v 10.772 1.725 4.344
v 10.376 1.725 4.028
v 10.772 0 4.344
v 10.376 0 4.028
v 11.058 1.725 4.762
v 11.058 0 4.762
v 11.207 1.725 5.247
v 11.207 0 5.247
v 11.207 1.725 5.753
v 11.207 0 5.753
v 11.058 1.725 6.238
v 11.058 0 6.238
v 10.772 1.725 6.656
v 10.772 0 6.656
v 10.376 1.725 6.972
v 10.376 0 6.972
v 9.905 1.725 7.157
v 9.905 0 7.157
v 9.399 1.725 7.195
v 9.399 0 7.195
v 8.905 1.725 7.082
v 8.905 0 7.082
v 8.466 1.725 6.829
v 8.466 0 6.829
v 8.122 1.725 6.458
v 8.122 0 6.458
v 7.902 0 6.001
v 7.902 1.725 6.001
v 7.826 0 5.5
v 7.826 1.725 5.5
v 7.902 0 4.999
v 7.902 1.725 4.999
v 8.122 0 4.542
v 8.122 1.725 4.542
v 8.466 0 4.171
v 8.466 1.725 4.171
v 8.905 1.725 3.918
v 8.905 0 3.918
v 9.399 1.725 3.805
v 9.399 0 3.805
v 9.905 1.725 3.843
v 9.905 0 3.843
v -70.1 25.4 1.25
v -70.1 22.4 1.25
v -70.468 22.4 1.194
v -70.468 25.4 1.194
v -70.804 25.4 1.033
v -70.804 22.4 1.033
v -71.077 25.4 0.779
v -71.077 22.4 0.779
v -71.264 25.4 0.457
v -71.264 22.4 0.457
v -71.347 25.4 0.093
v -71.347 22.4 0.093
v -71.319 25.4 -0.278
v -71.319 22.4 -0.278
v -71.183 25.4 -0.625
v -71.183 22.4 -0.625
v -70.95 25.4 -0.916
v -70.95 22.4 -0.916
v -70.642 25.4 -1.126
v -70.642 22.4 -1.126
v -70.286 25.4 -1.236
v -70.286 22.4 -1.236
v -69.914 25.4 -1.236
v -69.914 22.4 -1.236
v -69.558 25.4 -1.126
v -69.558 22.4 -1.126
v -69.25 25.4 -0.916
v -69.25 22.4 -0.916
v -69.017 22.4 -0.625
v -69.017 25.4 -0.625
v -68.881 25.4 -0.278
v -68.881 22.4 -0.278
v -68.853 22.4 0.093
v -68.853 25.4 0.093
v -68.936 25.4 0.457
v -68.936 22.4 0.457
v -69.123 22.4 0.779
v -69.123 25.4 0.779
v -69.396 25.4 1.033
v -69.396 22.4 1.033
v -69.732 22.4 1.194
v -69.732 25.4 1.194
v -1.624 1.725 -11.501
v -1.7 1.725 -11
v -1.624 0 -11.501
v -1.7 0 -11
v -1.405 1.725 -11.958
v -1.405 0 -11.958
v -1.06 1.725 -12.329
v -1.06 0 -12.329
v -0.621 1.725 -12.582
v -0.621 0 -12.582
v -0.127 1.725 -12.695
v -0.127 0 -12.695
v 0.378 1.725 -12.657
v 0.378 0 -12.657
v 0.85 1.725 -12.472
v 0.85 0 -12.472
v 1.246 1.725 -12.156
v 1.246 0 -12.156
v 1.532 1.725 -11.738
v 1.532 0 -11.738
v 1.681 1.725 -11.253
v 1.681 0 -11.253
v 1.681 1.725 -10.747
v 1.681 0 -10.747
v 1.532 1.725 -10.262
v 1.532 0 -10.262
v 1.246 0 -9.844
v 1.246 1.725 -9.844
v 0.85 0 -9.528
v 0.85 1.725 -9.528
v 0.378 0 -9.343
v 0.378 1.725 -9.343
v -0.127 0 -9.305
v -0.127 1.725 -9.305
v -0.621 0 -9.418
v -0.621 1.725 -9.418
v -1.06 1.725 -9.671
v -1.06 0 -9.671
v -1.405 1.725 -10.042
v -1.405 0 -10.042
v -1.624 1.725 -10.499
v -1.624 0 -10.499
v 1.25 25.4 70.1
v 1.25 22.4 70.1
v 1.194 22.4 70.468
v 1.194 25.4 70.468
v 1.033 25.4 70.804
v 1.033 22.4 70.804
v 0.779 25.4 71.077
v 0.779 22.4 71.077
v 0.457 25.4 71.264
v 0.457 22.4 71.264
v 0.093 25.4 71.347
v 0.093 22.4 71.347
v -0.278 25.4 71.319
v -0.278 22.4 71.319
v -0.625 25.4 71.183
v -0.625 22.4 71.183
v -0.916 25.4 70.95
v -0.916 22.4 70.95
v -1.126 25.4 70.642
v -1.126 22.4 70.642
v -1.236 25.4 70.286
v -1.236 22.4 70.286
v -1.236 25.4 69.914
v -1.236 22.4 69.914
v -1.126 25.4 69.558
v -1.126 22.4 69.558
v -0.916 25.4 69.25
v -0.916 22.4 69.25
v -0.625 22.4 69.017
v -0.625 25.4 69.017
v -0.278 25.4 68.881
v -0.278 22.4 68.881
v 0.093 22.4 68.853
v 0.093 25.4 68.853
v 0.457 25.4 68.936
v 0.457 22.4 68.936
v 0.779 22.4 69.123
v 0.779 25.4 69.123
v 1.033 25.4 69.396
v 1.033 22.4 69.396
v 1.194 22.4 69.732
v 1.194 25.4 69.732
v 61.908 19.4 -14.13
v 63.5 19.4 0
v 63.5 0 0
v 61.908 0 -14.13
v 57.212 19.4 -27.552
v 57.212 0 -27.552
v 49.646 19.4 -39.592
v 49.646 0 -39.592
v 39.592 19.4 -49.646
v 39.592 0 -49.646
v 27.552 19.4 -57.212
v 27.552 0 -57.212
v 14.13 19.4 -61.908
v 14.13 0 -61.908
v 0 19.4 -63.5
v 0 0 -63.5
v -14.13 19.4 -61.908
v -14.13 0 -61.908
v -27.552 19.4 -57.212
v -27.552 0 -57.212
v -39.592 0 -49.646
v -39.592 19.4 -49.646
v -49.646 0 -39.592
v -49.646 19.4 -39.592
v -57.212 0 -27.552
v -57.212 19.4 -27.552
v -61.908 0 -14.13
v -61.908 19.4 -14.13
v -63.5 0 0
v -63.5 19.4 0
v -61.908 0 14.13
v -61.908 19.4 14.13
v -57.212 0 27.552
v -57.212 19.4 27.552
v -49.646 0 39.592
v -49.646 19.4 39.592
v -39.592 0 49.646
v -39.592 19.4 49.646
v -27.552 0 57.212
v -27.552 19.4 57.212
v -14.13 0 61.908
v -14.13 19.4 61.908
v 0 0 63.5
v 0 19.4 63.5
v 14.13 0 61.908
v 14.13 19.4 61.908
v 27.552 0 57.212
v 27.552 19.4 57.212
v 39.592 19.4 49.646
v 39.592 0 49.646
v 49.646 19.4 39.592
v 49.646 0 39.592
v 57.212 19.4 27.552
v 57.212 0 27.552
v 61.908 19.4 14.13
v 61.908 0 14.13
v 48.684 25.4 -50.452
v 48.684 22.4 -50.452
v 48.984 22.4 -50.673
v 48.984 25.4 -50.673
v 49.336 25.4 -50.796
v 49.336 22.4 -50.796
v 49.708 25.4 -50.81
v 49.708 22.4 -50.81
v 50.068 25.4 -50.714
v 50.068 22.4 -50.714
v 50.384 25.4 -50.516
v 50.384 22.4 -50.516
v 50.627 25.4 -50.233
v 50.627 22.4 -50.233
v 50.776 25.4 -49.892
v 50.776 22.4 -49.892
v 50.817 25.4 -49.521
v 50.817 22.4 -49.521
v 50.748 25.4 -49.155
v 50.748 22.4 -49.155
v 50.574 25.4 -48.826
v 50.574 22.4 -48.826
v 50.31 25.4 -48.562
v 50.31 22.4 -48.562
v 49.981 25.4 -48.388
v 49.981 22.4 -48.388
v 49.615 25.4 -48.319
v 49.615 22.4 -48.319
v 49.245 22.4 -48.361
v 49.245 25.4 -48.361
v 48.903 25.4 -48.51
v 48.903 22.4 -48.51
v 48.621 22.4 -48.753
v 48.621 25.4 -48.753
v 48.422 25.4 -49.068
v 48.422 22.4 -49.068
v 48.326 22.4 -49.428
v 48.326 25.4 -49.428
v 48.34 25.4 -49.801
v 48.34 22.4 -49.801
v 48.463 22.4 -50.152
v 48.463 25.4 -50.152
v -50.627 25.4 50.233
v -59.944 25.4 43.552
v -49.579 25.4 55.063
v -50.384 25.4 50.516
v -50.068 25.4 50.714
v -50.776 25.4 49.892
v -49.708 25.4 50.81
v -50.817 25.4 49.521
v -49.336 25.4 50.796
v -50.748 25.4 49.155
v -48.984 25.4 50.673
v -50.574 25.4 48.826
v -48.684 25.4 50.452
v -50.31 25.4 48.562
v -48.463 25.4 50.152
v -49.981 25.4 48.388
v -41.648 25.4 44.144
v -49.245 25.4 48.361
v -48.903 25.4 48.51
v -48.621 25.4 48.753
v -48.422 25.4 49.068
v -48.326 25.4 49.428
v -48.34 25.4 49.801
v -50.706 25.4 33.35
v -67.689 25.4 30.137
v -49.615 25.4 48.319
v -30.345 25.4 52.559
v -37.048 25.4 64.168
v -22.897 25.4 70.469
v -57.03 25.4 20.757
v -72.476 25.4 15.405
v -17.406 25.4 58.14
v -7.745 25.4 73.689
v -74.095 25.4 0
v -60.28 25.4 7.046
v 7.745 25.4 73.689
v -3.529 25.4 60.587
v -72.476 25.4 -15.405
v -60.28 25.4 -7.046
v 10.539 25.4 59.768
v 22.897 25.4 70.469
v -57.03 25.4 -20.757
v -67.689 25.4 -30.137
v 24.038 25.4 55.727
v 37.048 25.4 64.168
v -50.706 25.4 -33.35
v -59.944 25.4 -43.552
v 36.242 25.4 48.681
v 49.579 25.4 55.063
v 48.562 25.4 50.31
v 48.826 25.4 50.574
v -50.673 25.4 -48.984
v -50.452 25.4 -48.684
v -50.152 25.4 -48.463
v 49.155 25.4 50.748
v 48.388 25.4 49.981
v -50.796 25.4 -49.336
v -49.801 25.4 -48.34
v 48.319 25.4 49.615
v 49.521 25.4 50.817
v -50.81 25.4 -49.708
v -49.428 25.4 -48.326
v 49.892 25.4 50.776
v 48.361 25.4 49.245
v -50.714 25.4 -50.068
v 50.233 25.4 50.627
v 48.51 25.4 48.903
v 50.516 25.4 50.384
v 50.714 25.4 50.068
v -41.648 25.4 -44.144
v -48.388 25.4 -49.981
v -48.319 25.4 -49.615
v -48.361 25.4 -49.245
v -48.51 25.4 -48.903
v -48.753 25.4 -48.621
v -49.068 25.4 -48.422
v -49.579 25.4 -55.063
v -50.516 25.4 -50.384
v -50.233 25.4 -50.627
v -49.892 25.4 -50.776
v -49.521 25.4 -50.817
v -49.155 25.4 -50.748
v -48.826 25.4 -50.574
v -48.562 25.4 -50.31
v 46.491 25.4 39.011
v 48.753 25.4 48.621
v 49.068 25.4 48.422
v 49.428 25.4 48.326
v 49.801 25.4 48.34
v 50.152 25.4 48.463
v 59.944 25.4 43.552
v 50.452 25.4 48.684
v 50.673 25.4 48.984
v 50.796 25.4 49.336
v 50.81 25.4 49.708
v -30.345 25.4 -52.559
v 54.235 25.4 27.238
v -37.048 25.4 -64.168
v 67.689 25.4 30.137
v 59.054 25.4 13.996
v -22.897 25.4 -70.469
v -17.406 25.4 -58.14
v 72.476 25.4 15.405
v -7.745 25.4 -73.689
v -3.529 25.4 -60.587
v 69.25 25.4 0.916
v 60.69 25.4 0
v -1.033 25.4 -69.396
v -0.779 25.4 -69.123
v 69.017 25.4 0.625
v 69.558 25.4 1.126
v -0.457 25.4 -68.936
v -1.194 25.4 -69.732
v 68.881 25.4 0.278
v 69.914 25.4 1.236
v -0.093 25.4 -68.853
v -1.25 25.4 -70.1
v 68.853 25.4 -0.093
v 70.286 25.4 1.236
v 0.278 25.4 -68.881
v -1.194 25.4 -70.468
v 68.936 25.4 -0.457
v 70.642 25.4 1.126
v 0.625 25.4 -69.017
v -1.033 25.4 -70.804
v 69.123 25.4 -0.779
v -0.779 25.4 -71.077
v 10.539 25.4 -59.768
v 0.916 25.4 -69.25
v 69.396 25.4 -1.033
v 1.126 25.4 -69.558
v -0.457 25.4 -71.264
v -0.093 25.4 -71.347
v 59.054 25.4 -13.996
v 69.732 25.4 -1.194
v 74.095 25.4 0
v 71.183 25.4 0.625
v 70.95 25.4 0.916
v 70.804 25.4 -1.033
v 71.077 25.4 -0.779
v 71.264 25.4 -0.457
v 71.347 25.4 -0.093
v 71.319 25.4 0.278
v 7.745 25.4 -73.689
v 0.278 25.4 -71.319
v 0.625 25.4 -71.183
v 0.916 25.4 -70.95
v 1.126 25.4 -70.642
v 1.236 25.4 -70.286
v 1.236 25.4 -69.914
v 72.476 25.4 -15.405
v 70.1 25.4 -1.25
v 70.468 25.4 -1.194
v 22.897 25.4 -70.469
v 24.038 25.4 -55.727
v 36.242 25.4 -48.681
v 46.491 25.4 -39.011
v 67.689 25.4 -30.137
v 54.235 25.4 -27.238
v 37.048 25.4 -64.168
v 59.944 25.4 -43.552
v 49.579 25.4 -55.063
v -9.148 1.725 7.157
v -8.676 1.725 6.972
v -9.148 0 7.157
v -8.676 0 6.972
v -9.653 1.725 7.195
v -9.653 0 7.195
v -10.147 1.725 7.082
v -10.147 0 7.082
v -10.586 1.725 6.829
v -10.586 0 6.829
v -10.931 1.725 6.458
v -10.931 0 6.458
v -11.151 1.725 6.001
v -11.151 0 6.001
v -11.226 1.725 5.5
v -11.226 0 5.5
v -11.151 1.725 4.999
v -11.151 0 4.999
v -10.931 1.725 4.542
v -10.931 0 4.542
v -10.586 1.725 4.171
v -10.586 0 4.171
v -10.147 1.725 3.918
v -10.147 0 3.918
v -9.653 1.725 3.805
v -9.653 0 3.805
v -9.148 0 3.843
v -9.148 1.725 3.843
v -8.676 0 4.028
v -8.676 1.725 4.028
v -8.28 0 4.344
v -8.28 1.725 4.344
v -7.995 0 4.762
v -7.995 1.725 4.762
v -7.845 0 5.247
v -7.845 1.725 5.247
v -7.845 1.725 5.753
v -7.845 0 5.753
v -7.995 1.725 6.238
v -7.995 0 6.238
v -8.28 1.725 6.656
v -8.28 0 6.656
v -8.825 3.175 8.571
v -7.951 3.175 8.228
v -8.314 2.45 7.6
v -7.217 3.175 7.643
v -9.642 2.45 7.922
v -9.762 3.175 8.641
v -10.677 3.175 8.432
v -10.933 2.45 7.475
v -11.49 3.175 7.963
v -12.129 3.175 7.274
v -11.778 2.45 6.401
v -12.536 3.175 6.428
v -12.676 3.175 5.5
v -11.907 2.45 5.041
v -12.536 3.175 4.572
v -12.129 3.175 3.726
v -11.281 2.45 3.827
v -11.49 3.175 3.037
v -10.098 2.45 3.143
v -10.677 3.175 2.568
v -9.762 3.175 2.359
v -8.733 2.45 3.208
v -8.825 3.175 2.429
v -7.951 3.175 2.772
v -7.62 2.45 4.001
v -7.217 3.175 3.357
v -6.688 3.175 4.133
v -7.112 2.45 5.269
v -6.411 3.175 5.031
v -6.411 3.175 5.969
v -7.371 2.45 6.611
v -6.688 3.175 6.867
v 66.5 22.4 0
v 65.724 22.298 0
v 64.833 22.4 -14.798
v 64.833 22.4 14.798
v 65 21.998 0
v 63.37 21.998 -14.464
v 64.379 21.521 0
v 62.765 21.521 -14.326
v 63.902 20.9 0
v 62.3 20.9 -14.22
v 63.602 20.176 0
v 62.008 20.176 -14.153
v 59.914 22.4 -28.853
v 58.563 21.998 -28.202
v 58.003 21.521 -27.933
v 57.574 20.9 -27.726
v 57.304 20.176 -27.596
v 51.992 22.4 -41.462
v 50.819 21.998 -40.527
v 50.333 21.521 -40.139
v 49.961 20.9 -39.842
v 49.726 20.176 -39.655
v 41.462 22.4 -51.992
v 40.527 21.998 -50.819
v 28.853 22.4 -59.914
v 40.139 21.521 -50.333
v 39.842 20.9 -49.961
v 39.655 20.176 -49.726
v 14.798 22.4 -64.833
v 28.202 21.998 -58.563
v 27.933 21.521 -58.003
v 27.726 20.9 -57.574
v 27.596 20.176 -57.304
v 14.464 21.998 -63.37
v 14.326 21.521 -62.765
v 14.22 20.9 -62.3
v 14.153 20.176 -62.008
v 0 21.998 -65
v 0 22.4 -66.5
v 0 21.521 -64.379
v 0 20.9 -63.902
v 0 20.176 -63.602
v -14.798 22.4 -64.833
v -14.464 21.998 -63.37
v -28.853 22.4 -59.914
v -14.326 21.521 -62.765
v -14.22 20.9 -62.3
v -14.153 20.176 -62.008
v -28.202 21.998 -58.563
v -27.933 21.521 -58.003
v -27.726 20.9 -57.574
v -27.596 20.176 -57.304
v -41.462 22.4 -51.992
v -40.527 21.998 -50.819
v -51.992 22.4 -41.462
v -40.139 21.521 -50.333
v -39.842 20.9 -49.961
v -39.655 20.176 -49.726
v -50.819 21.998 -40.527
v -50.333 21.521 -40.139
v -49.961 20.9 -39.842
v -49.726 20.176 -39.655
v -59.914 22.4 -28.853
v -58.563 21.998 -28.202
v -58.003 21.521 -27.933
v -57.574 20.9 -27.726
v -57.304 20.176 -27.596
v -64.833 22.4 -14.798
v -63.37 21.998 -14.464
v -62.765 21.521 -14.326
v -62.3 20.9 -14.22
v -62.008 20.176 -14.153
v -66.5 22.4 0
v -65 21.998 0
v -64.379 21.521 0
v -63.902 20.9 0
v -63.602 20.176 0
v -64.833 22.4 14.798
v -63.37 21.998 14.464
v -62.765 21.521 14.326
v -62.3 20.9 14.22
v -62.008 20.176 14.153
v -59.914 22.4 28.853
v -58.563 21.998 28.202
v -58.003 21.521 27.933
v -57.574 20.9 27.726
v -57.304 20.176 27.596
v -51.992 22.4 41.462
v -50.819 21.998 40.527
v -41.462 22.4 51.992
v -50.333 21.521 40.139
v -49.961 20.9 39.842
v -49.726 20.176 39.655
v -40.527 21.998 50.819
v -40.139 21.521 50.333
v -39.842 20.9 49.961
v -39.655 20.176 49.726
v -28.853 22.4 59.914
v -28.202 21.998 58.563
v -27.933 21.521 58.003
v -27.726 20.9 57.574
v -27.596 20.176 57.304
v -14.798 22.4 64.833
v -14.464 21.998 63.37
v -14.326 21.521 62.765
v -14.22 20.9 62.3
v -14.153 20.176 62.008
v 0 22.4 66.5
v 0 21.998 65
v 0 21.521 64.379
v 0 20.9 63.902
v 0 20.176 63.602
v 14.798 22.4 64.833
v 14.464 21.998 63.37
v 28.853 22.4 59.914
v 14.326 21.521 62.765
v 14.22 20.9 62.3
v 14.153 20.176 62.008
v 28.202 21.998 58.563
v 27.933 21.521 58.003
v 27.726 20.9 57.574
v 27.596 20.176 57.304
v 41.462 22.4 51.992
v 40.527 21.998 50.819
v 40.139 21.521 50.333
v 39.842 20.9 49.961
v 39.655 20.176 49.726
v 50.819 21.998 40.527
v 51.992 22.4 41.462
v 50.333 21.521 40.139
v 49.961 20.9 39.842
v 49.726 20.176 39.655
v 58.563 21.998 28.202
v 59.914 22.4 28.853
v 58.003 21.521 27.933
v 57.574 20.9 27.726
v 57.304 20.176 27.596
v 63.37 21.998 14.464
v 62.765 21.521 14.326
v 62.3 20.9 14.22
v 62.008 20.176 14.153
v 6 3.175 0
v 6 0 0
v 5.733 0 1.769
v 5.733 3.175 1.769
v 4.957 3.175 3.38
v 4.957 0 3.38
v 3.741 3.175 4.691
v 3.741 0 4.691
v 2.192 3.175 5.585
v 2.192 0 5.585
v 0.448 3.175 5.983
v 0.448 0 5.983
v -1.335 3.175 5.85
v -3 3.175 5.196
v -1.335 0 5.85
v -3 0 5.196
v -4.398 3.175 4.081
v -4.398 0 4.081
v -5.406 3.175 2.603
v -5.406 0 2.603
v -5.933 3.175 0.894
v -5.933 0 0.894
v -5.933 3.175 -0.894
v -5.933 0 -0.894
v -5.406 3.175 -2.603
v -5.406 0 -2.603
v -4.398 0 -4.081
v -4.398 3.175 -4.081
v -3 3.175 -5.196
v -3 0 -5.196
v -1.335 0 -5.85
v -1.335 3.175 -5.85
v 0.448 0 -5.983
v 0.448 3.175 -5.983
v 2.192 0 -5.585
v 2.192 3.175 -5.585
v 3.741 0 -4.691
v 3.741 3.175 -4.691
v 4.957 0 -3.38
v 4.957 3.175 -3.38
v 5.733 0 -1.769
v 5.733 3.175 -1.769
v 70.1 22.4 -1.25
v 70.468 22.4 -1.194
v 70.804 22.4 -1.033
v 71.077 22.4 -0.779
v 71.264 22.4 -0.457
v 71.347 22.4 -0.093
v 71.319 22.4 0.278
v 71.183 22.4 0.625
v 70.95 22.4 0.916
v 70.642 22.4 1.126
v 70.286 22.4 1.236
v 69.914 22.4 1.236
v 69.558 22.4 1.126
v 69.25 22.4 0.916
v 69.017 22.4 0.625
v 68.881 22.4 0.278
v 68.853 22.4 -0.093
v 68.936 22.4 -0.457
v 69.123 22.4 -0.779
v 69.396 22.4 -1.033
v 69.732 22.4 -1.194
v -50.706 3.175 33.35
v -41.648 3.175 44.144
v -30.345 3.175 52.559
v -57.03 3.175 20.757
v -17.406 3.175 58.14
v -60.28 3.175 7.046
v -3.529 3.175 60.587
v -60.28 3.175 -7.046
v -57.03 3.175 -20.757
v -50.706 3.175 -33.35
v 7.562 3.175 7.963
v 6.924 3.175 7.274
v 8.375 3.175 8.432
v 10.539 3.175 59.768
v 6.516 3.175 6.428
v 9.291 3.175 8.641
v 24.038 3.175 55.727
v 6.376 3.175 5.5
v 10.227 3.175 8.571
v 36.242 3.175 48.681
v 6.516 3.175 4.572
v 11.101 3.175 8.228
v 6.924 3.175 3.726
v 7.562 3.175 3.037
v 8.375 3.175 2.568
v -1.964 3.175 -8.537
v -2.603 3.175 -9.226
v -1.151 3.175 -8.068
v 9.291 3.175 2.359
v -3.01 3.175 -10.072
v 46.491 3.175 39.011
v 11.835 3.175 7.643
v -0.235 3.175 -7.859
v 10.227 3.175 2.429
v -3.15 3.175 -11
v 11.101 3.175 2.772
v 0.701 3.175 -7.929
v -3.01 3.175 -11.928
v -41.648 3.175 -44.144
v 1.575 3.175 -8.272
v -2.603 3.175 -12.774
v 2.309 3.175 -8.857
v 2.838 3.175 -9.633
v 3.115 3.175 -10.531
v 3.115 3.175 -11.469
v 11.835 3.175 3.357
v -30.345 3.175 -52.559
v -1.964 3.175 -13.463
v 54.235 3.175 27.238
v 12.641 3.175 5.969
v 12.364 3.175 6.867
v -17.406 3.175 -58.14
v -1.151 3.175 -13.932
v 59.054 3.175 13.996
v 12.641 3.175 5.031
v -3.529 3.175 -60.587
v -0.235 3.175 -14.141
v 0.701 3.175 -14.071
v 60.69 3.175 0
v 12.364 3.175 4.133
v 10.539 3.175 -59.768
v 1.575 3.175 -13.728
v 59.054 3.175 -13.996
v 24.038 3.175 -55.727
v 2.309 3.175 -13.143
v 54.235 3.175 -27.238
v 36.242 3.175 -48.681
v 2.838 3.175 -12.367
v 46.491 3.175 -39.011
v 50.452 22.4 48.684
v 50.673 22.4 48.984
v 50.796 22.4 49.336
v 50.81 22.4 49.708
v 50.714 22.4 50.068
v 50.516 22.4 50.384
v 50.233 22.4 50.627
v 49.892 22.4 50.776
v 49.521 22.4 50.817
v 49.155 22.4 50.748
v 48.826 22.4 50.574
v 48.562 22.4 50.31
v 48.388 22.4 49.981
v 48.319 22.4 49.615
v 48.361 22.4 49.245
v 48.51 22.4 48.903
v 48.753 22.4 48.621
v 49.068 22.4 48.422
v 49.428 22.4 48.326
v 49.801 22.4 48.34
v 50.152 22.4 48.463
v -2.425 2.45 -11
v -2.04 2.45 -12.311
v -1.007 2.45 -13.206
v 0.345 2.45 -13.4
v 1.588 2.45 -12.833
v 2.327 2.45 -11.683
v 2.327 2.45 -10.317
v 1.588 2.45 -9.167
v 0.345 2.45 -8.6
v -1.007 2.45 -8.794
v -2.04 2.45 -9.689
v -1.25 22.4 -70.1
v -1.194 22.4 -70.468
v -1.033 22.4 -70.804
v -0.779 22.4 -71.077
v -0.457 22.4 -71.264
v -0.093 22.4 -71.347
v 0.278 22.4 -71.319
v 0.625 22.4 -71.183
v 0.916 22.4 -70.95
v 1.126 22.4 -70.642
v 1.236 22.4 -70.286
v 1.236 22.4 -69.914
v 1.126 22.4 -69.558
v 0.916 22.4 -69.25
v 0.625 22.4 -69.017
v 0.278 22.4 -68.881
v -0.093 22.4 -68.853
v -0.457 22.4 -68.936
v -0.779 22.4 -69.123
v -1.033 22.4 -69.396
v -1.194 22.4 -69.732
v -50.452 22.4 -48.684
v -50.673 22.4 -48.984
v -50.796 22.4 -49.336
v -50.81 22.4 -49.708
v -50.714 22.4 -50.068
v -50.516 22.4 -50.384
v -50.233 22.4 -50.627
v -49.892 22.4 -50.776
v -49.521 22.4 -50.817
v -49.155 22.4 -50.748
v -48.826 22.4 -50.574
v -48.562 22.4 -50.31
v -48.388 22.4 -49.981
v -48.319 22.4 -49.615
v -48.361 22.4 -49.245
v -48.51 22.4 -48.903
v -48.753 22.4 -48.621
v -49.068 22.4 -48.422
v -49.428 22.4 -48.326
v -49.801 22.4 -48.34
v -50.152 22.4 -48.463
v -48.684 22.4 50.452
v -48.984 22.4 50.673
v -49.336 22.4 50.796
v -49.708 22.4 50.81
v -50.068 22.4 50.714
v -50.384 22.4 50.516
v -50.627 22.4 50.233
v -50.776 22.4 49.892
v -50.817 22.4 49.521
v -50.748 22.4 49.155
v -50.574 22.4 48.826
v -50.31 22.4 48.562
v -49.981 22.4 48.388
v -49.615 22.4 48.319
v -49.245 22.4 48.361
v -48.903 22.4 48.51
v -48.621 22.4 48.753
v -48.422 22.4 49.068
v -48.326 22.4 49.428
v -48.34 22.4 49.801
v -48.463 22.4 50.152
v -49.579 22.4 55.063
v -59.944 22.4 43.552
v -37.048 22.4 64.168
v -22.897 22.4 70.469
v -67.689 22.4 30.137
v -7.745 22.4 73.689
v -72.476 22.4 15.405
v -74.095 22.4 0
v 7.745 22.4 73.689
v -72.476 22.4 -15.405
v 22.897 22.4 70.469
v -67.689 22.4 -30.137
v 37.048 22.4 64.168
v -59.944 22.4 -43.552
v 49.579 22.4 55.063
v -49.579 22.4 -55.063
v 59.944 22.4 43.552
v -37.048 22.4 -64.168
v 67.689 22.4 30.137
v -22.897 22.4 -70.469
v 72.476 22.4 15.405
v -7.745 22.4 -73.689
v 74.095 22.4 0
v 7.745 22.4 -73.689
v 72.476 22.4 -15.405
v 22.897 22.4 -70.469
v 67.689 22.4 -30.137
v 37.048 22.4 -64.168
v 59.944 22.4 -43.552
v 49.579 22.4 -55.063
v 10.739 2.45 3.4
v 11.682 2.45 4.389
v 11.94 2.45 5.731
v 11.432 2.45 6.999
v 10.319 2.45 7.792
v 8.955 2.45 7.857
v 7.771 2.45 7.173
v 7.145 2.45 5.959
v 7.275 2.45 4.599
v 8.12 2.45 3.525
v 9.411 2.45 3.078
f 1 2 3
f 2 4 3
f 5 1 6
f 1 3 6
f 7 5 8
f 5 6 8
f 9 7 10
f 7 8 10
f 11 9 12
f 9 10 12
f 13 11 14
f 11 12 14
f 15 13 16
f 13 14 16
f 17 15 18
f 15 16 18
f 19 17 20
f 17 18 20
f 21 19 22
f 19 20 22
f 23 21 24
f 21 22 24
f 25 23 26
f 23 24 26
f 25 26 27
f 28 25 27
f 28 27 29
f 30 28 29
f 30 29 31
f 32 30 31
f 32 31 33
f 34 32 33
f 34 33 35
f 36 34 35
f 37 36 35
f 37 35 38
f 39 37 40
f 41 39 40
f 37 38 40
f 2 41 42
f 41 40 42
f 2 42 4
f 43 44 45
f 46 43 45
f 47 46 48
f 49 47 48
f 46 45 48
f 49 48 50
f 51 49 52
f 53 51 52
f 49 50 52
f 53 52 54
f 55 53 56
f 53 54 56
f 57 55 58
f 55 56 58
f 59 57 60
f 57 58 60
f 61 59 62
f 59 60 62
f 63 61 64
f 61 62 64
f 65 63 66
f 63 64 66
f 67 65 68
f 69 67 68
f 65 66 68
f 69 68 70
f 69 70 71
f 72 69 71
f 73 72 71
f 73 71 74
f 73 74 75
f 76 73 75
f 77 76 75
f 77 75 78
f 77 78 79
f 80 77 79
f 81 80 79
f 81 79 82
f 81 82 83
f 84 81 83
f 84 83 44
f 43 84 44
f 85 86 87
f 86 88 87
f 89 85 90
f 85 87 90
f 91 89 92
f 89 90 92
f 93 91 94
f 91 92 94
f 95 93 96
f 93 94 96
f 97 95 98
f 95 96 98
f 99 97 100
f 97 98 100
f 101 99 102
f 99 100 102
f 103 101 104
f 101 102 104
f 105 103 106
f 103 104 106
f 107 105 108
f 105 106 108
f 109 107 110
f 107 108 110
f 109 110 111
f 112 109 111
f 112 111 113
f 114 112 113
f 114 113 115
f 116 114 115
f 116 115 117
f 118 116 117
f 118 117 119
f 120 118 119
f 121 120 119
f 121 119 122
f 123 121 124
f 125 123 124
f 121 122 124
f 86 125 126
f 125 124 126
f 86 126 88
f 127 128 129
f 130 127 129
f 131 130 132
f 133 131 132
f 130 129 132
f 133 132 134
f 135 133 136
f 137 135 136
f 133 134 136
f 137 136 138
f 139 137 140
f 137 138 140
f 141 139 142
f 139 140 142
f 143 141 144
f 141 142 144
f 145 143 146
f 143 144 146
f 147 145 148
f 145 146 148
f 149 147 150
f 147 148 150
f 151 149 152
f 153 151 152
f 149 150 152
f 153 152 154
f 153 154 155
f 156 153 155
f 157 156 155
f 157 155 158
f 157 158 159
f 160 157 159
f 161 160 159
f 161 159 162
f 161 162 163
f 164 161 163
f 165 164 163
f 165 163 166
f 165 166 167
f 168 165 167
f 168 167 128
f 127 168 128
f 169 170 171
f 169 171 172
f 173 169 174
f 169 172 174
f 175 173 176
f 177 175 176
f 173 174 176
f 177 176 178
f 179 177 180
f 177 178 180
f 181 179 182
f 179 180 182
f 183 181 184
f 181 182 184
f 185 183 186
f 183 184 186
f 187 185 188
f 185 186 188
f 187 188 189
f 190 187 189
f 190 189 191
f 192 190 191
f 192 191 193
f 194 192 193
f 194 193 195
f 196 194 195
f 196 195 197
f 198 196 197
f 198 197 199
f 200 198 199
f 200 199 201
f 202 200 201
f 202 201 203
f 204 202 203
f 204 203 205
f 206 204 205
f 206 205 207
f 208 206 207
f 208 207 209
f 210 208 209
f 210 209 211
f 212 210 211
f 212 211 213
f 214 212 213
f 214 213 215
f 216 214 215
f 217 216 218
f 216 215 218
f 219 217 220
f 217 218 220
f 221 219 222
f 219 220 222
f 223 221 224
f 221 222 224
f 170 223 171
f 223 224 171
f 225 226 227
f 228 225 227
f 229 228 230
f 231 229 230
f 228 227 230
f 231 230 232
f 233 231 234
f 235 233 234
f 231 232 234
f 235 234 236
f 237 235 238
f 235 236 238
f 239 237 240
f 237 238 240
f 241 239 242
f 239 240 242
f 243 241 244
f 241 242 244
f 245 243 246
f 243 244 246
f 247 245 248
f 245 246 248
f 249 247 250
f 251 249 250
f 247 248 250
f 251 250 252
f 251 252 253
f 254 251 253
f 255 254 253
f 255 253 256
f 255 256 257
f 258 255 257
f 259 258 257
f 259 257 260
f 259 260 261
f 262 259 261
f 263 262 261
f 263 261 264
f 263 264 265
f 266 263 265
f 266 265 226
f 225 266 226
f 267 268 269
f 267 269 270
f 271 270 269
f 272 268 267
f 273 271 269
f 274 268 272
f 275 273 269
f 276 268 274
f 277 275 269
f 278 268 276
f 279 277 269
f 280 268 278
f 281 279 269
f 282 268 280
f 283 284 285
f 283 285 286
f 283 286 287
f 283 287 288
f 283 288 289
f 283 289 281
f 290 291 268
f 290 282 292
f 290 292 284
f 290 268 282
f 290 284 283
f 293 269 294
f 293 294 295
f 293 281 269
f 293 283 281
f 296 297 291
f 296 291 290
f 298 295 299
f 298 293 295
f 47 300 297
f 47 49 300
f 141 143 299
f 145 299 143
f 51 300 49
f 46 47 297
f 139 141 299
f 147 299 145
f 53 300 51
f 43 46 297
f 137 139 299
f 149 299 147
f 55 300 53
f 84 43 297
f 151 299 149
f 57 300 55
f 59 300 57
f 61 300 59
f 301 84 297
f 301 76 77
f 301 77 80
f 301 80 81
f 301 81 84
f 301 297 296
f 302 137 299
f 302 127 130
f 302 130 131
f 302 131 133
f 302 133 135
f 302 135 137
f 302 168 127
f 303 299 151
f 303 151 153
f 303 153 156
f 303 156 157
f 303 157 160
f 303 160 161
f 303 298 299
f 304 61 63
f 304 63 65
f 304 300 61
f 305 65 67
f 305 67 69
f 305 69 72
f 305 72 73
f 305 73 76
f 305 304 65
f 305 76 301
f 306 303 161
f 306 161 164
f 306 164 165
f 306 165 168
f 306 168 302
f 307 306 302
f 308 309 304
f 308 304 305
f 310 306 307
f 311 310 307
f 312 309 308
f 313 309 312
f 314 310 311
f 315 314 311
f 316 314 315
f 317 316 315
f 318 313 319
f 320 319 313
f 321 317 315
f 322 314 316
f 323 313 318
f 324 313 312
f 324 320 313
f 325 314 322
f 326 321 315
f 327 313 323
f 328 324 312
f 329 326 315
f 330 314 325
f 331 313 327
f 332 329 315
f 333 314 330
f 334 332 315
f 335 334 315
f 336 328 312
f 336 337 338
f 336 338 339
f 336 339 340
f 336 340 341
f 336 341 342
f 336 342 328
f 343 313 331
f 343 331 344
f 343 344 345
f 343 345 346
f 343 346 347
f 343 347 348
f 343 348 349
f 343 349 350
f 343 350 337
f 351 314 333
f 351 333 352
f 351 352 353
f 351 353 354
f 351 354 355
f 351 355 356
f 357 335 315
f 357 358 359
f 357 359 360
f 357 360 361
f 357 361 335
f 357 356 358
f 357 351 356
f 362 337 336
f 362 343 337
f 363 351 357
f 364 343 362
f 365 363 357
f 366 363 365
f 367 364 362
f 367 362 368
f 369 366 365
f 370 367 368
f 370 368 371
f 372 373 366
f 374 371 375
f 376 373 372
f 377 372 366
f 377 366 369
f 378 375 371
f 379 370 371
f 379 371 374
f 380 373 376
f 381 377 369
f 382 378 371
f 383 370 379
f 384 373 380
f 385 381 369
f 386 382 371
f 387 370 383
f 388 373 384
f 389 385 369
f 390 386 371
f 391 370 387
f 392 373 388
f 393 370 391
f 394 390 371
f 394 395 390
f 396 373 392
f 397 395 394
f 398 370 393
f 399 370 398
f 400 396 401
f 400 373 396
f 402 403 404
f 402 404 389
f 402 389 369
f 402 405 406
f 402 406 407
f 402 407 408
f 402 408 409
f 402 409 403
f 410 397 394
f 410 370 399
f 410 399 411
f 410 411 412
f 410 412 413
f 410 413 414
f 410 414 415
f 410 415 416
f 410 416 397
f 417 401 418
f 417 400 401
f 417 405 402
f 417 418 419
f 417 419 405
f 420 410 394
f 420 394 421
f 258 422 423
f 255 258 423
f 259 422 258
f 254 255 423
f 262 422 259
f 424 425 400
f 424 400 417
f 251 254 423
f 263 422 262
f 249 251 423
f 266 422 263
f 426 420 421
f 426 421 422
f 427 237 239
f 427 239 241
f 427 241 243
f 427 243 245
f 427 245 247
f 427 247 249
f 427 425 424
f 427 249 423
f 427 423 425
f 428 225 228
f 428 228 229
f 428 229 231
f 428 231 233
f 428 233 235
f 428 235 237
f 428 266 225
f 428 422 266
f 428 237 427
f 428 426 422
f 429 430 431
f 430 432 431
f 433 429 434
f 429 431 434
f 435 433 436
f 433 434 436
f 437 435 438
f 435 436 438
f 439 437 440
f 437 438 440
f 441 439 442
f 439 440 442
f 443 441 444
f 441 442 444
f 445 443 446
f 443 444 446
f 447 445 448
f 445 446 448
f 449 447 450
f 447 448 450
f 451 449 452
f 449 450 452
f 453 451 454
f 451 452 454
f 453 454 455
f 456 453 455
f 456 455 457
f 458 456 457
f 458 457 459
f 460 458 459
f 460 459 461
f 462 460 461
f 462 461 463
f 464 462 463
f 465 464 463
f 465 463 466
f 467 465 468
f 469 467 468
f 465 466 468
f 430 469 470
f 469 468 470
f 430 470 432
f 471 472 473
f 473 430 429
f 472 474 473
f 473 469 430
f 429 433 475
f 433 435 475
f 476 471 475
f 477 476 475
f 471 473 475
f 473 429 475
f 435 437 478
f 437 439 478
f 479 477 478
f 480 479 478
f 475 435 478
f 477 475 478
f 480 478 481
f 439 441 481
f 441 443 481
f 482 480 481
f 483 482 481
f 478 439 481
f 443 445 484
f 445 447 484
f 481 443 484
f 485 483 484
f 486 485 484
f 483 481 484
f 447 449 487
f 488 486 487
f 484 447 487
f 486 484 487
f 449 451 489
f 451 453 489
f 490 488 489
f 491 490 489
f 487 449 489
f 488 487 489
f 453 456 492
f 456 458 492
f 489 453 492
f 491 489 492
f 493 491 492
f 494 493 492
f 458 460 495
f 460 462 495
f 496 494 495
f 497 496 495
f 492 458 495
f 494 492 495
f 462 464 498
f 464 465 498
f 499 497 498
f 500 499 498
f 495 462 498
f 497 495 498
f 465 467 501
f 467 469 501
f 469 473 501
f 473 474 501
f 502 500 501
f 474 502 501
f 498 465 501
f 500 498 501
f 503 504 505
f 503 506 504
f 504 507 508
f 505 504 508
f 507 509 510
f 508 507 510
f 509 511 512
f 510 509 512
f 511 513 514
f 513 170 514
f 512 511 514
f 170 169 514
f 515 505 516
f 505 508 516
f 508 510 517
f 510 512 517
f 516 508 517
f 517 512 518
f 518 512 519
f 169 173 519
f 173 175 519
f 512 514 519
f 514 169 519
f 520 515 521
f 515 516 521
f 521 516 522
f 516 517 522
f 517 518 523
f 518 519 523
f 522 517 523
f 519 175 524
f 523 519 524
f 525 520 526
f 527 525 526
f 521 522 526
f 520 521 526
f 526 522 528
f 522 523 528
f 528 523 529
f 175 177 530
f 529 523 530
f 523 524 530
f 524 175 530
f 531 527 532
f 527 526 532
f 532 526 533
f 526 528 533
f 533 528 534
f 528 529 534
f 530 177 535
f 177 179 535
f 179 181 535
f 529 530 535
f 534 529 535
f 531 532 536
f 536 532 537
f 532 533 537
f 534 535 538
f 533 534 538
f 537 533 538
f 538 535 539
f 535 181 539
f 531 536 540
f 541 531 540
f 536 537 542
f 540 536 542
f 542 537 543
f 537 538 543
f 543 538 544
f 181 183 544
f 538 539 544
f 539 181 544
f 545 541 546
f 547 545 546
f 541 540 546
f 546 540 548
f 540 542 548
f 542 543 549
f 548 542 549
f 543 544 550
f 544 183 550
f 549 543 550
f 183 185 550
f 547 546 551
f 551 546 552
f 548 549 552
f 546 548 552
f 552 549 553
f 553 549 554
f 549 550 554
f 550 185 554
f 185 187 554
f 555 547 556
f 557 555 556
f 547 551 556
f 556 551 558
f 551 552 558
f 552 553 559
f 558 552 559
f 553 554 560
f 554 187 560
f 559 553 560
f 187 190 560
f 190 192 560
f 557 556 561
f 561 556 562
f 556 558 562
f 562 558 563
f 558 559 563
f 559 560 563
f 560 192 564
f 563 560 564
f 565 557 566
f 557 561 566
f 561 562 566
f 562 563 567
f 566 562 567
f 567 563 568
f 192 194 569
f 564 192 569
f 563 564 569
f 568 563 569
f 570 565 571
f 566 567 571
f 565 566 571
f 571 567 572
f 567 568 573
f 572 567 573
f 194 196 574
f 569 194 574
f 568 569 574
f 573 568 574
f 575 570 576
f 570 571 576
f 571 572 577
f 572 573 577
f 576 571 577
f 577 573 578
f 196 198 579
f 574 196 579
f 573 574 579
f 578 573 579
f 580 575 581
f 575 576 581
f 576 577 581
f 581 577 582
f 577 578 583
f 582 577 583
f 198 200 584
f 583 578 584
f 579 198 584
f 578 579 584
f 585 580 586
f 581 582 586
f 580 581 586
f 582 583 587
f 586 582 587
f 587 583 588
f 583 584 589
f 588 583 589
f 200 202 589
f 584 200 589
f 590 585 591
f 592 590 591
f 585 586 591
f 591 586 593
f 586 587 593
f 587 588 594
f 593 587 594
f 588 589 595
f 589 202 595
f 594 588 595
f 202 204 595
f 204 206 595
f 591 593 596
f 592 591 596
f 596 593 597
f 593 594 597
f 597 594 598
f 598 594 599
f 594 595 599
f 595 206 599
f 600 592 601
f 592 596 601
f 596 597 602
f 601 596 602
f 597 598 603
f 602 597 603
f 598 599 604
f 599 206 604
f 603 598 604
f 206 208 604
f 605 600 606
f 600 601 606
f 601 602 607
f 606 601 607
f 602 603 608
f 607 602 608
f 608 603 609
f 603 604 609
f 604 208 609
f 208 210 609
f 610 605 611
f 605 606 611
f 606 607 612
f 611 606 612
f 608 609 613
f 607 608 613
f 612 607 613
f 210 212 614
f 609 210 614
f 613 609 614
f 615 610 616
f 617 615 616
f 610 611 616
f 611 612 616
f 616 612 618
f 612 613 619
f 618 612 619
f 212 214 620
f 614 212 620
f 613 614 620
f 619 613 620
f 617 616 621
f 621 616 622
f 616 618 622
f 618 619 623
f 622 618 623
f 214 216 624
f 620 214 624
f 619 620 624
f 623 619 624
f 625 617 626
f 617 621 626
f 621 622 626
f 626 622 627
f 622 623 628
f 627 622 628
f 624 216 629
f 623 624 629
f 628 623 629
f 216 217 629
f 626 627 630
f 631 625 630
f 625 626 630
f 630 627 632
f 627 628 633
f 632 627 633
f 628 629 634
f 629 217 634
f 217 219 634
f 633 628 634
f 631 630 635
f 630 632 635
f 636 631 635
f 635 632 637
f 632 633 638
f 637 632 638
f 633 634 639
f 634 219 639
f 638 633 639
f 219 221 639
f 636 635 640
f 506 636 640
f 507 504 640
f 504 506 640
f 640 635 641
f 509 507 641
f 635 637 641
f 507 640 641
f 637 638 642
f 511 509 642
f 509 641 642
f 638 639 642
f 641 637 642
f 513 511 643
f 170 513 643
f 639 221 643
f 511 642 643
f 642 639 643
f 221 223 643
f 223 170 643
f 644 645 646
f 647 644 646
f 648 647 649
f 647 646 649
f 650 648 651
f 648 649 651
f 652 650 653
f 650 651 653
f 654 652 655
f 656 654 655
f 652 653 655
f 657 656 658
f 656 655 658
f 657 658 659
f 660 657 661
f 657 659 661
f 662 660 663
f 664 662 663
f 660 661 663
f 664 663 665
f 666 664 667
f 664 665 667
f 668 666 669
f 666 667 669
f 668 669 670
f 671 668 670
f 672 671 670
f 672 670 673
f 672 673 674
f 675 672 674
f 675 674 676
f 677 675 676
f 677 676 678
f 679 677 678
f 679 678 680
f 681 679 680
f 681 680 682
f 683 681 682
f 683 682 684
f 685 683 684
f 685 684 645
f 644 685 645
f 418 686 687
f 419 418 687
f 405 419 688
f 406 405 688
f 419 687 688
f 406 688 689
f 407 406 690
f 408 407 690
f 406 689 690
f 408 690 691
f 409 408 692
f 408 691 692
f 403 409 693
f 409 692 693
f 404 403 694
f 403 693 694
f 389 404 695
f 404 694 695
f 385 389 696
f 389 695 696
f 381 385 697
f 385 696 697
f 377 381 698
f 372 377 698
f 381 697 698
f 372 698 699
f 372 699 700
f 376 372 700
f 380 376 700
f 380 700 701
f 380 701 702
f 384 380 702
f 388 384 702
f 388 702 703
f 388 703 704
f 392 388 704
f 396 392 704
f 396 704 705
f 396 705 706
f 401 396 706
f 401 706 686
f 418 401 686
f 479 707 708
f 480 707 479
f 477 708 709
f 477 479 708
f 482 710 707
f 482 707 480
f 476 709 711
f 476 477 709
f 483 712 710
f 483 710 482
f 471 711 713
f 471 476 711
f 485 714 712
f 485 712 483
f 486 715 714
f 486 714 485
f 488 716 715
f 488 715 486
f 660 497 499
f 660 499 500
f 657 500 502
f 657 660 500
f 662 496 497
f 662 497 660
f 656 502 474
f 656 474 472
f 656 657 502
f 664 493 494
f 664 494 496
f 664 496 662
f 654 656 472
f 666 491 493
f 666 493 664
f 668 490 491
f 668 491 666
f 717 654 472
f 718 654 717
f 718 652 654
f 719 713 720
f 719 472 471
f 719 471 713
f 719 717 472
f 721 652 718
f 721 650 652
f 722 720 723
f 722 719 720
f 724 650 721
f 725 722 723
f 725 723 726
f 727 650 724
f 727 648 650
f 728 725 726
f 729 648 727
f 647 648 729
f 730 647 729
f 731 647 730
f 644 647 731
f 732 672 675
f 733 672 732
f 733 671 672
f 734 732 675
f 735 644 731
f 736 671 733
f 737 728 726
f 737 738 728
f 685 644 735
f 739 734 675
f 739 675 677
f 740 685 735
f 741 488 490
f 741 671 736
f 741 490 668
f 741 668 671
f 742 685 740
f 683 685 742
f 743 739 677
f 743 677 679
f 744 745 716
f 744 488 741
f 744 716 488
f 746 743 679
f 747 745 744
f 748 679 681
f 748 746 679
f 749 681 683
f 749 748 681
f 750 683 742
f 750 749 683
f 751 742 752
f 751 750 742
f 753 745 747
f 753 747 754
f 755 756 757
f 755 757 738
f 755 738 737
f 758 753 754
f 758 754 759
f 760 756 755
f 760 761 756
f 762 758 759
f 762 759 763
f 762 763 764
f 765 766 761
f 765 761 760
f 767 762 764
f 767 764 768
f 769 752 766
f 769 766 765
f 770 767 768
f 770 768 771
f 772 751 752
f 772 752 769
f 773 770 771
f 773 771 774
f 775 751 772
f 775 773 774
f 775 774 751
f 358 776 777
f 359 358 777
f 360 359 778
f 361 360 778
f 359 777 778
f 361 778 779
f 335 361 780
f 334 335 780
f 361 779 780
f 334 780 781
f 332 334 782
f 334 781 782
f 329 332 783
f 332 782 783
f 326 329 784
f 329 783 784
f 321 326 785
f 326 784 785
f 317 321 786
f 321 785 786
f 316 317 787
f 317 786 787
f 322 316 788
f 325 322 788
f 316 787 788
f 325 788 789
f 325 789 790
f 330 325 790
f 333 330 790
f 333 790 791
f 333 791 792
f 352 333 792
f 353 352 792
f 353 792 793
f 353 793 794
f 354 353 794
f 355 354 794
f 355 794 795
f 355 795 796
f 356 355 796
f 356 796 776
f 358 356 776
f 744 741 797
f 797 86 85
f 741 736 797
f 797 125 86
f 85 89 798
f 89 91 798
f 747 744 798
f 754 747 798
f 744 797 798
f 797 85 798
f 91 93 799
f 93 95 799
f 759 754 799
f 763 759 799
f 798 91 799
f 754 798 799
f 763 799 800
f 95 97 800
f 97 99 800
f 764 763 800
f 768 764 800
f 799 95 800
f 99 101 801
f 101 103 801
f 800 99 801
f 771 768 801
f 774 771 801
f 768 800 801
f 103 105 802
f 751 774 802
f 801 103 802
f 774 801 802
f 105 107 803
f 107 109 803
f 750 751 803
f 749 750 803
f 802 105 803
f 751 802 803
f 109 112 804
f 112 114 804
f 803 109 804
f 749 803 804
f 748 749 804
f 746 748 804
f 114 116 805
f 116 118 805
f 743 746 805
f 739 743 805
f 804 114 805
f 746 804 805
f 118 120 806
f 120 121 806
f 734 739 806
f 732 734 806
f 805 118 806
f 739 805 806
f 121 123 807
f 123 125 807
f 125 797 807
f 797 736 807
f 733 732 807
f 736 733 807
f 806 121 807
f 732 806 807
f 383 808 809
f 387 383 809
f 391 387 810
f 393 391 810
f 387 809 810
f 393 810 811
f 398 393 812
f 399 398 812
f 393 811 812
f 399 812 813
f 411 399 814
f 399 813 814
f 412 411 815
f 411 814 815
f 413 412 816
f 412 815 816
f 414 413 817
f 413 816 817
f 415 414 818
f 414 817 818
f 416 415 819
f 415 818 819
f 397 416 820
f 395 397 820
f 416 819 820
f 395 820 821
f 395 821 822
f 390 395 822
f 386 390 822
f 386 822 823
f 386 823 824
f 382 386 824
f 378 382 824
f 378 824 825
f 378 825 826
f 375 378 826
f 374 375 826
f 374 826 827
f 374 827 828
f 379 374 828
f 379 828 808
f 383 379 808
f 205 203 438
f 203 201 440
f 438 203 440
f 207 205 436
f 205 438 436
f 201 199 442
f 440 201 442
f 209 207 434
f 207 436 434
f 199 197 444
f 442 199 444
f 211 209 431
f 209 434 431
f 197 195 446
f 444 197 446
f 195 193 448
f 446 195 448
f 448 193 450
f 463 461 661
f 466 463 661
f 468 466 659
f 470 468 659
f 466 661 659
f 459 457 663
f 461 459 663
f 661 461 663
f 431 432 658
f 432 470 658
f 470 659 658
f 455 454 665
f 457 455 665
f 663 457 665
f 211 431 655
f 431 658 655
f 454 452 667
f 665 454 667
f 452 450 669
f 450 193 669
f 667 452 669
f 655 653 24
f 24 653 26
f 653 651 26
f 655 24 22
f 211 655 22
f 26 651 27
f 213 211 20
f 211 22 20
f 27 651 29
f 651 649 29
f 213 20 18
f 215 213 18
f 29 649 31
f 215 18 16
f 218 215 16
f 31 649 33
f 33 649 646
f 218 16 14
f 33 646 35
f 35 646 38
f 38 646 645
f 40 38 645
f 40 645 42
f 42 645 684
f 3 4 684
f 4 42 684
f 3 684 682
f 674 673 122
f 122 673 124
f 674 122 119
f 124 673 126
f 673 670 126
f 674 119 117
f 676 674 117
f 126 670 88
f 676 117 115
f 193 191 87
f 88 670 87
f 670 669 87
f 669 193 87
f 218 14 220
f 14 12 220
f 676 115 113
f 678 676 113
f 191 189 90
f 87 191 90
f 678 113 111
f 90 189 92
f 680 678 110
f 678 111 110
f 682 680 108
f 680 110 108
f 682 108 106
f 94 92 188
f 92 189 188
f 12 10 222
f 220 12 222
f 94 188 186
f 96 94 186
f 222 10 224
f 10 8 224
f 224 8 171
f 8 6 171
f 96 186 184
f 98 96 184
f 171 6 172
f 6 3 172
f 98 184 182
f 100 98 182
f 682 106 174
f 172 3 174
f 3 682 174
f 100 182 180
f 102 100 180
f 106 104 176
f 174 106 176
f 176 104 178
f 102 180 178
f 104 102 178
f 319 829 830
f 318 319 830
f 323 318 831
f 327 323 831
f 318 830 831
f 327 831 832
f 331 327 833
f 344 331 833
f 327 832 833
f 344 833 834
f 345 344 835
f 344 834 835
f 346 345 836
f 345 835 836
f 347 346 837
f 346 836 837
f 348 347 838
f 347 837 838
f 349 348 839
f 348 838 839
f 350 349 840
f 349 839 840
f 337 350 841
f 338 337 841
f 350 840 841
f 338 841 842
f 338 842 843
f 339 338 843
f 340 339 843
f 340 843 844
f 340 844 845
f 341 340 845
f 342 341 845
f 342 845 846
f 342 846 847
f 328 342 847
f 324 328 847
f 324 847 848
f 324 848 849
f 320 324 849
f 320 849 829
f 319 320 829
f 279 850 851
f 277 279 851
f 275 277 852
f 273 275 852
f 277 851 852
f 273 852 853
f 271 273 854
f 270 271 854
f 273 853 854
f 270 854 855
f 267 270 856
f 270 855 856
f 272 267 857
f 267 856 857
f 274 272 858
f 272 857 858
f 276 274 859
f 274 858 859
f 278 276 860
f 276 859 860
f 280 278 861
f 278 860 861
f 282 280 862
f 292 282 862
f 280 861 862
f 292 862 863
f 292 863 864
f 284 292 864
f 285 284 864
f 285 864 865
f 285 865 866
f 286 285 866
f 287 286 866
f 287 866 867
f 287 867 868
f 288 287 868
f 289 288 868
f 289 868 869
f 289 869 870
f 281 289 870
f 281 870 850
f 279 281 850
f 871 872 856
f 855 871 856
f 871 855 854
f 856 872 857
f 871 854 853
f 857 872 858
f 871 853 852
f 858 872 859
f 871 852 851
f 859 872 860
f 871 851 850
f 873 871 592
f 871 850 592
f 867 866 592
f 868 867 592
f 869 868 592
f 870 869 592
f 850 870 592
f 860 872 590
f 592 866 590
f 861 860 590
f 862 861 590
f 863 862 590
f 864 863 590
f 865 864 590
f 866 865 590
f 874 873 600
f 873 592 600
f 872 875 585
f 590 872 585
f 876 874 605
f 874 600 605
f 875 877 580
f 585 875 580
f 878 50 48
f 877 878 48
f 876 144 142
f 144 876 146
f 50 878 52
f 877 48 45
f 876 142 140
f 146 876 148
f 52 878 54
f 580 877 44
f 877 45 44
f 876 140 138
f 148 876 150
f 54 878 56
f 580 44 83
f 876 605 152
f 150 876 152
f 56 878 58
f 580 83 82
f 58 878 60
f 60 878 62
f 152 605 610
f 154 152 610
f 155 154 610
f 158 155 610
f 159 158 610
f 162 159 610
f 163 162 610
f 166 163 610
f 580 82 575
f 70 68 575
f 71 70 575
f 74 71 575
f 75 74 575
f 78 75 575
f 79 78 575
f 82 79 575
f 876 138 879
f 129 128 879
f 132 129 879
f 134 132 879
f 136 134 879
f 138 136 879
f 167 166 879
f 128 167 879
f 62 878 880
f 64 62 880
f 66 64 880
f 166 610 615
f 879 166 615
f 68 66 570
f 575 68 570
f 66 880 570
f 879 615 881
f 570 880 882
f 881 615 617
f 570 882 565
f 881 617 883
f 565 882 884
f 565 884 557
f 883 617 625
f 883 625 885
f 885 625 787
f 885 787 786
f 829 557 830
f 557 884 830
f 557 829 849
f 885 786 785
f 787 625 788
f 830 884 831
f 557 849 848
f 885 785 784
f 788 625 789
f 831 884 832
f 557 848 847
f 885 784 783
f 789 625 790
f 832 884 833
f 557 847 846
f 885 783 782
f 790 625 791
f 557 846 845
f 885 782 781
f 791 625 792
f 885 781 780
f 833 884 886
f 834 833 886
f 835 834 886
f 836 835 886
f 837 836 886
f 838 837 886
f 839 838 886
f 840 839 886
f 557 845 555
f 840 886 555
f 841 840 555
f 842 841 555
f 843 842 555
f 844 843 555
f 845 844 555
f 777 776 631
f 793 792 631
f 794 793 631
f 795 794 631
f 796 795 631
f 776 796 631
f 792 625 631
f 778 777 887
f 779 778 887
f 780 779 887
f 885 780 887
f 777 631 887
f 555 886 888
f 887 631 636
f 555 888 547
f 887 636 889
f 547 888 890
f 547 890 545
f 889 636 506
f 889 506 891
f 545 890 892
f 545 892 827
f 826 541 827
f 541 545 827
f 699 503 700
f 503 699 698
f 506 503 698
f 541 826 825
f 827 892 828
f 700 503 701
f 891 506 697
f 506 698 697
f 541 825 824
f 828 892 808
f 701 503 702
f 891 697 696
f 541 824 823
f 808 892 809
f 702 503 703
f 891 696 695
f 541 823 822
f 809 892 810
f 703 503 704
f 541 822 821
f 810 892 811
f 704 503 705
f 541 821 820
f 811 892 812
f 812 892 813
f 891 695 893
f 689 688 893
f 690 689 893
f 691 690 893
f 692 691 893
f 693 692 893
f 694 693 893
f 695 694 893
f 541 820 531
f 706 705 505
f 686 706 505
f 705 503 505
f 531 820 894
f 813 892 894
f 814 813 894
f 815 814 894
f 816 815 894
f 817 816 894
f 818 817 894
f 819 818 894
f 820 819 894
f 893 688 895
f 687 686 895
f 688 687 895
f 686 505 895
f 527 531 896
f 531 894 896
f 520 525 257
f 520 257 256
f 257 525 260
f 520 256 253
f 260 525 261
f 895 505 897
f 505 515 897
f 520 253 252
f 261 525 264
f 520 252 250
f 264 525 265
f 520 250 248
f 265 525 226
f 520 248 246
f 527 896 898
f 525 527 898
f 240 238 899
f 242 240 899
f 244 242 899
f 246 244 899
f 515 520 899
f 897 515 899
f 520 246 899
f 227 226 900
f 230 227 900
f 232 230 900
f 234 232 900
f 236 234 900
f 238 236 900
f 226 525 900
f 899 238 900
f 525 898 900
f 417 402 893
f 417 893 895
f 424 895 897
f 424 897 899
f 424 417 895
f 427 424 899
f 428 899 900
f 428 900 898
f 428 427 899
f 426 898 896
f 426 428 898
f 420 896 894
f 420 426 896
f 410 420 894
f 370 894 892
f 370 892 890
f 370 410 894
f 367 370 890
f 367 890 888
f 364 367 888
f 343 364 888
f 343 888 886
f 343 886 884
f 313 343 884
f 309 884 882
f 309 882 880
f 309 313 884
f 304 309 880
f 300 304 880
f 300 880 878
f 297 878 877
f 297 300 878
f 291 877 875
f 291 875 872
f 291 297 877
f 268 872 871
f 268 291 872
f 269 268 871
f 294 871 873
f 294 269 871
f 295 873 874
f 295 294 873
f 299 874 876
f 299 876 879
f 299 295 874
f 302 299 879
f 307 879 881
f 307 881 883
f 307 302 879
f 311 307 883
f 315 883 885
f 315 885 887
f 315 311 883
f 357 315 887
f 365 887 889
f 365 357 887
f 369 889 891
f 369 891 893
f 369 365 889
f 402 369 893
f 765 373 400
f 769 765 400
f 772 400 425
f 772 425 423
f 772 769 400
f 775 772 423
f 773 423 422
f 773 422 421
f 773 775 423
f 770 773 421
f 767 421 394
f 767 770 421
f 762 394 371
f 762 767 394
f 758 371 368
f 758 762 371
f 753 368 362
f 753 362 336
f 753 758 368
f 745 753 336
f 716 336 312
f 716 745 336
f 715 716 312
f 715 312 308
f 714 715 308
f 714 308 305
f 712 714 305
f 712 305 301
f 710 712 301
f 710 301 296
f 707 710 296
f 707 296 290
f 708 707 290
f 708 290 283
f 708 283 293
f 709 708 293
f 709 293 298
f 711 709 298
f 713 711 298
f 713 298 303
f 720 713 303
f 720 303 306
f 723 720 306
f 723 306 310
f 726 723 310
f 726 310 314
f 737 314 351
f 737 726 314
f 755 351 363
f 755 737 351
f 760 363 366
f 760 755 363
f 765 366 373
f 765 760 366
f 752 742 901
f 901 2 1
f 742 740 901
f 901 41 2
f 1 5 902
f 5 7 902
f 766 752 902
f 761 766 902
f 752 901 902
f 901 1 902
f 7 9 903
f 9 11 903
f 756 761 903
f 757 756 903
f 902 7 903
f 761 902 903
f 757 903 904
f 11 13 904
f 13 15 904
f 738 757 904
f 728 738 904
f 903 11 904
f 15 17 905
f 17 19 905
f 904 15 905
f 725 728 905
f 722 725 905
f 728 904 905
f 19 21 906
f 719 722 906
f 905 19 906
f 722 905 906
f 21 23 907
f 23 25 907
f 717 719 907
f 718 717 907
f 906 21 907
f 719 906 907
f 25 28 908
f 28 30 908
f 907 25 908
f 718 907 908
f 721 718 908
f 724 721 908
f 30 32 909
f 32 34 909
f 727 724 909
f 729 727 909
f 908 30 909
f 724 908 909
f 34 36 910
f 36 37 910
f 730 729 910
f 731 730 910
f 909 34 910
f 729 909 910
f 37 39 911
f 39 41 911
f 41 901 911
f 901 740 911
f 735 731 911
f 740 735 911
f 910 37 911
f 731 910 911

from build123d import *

# Parameters (mm, degrees)
SKETCH1_R                                       = 63.5
SKETCH1_R_2                                     = 60.690000065
BOSS_EXTRUDE1_DEPTH                             = 25.4
SKETCH3_R                                       = 63.5
BOSS_EXTRUDE2_DEPTH                             = 3.175
CUT_EXTRUDE1_REACH                              = 27.4
SKETCH8_R                                       = 6
SKETCH9_R                                       = 74.095000033
SKETCH9_R_2                                     = 63.5
BOSS_EXTRUDE4_DEPTH                             = 3
M3X0_5_TAPPED_HOLE1_D                           = 2.5
CIRPATTERN2_COUNT                               = 8
FILLET1_R                                       = 3
CSK_FOR_M3_FLAT_HEAD_MACHINE_SCREW1_D           = 3.4
CSK_FOR_M3_FLAT_HEAD_MACHINE_SCREW1_CSINK_D     = 6.3
CSK_FOR_M3_FLAT_HEAD_MACHINE_SCREW1_CSINK_ANGLE = 90
CIRPATTERN3_COUNT                               = 3


with BuildPart() as part:
    # Sketch1 → Boss-Extrude1 (new body)
    with BuildSketch(Plane(origin=(0, 0, 0), x_dir=(1, 0, 0), z_dir=(0, 1, 0))):
        Circle(SKETCH1_R)
        Circle(SKETCH1_R_2, mode=Mode.SUBTRACT)
    extrude(amount=BOSS_EXTRUDE1_DEPTH)

    # Sketch3 → Boss-Extrude2 (add)
    with BuildSketch(Plane(origin=(0, 0, 0), x_dir=(1, 0, 0), z_dir=(0, 1, 0))):
        Circle(SKETCH3_R)
    extrude(amount=BOSS_EXTRUDE2_DEPTH)

    # Sketch8 → Cut-Extrude1 (cut, up to next)
    with BuildSketch(Plane.XZ, mode=Mode.PRIVATE) as cut_extrude1_sk1:
        Circle(SKETCH8_R)
    cut_extrude1_tool1 = extrude(cut_extrude1_sk1.sketch, amount=-CUT_EXTRUDE1_REACH, mode=Mode.PRIVATE) & part.part
    add(cut_extrude1_tool1.solids().sort_by_distance((0, 0, 0))[0], mode=Mode.SUBTRACT)

    # Sketch9 → Boss-Extrude4 (add)
    with BuildSketch(Plane(origin=(0, 25.4, 0), x_dir=(1, 0, 0), z_dir=(0, 1, 0))):
        Circle(SKETCH9_R)
        Circle(SKETCH9_R_2, mode=Mode.SUBTRACT)
    extrude(amount=-BOSS_EXTRUDE4_DEPTH)

    # M3x0.5 Tapped Hole1 (through all)
    with Locations(Plane(origin=(0, 25.4, 0), x_dir=(1, 0, 0), z_dir=(0, 1, 0))):
        with Locations((0, 70.1)):
            m3x0_5_tapped_hole1 = Hole(M3X0_5_TAPPED_HOLE1_D / 2)

    # CirPattern2: M3x0.5 Tapped Hole1 ×8 about axis
    cirpattern2_axis = Axis((0, 0, 0), (0, 1, 0))
    for i in range(1, CIRPATTERN2_COUNT):
        add(m3x0_5_tapped_hole1.rotate(cirpattern2_axis, i * 360 / CIRPATTERN2_COUNT), mode=Mode.SUBTRACT)

    # Fillet1
    fillet1_edges = [part.edges().sort_by_distance(p)[0] for p in [
        (-63.5, 22.4, 0),
    ]]
    fillet(fillet1_edges, radius=FILLET1_R)

    # CSK for M3 Flat Head Machine Screw1 (through all)
    with Locations(Plane(origin=(0, 3.175, 0), x_dir=(1, 0, 0), z_dir=(0, 1, 0))):
        with Locations((0, 11)):
            csk_for_m3_flat_head_machine_screw1 = CounterSinkHole(CSK_FOR_M3_FLAT_HEAD_MACHINE_SCREW1_D / 2, CSK_FOR_M3_FLAT_HEAD_MACHINE_SCREW1_CSINK_D / 2, counter_sink_angle=CSK_FOR_M3_FLAT_HEAD_MACHINE_SCREW1_CSINK_ANGLE)

    # CirPattern3: CSK for M3 Flat Head Machine Screw1 ×3 about axis
    cirpattern3_axis = Axis((0, 0, 0), (0, 1, 0))
    for i in range(1, CIRPATTERN3_COUNT):
        add(csk_for_m3_flat_head_machine_screw1.rotate(cirpattern3_axis, i * 360 / CIRPATTERN3_COUNT), mode=Mode.SUBTRACT)


solid = part.part
